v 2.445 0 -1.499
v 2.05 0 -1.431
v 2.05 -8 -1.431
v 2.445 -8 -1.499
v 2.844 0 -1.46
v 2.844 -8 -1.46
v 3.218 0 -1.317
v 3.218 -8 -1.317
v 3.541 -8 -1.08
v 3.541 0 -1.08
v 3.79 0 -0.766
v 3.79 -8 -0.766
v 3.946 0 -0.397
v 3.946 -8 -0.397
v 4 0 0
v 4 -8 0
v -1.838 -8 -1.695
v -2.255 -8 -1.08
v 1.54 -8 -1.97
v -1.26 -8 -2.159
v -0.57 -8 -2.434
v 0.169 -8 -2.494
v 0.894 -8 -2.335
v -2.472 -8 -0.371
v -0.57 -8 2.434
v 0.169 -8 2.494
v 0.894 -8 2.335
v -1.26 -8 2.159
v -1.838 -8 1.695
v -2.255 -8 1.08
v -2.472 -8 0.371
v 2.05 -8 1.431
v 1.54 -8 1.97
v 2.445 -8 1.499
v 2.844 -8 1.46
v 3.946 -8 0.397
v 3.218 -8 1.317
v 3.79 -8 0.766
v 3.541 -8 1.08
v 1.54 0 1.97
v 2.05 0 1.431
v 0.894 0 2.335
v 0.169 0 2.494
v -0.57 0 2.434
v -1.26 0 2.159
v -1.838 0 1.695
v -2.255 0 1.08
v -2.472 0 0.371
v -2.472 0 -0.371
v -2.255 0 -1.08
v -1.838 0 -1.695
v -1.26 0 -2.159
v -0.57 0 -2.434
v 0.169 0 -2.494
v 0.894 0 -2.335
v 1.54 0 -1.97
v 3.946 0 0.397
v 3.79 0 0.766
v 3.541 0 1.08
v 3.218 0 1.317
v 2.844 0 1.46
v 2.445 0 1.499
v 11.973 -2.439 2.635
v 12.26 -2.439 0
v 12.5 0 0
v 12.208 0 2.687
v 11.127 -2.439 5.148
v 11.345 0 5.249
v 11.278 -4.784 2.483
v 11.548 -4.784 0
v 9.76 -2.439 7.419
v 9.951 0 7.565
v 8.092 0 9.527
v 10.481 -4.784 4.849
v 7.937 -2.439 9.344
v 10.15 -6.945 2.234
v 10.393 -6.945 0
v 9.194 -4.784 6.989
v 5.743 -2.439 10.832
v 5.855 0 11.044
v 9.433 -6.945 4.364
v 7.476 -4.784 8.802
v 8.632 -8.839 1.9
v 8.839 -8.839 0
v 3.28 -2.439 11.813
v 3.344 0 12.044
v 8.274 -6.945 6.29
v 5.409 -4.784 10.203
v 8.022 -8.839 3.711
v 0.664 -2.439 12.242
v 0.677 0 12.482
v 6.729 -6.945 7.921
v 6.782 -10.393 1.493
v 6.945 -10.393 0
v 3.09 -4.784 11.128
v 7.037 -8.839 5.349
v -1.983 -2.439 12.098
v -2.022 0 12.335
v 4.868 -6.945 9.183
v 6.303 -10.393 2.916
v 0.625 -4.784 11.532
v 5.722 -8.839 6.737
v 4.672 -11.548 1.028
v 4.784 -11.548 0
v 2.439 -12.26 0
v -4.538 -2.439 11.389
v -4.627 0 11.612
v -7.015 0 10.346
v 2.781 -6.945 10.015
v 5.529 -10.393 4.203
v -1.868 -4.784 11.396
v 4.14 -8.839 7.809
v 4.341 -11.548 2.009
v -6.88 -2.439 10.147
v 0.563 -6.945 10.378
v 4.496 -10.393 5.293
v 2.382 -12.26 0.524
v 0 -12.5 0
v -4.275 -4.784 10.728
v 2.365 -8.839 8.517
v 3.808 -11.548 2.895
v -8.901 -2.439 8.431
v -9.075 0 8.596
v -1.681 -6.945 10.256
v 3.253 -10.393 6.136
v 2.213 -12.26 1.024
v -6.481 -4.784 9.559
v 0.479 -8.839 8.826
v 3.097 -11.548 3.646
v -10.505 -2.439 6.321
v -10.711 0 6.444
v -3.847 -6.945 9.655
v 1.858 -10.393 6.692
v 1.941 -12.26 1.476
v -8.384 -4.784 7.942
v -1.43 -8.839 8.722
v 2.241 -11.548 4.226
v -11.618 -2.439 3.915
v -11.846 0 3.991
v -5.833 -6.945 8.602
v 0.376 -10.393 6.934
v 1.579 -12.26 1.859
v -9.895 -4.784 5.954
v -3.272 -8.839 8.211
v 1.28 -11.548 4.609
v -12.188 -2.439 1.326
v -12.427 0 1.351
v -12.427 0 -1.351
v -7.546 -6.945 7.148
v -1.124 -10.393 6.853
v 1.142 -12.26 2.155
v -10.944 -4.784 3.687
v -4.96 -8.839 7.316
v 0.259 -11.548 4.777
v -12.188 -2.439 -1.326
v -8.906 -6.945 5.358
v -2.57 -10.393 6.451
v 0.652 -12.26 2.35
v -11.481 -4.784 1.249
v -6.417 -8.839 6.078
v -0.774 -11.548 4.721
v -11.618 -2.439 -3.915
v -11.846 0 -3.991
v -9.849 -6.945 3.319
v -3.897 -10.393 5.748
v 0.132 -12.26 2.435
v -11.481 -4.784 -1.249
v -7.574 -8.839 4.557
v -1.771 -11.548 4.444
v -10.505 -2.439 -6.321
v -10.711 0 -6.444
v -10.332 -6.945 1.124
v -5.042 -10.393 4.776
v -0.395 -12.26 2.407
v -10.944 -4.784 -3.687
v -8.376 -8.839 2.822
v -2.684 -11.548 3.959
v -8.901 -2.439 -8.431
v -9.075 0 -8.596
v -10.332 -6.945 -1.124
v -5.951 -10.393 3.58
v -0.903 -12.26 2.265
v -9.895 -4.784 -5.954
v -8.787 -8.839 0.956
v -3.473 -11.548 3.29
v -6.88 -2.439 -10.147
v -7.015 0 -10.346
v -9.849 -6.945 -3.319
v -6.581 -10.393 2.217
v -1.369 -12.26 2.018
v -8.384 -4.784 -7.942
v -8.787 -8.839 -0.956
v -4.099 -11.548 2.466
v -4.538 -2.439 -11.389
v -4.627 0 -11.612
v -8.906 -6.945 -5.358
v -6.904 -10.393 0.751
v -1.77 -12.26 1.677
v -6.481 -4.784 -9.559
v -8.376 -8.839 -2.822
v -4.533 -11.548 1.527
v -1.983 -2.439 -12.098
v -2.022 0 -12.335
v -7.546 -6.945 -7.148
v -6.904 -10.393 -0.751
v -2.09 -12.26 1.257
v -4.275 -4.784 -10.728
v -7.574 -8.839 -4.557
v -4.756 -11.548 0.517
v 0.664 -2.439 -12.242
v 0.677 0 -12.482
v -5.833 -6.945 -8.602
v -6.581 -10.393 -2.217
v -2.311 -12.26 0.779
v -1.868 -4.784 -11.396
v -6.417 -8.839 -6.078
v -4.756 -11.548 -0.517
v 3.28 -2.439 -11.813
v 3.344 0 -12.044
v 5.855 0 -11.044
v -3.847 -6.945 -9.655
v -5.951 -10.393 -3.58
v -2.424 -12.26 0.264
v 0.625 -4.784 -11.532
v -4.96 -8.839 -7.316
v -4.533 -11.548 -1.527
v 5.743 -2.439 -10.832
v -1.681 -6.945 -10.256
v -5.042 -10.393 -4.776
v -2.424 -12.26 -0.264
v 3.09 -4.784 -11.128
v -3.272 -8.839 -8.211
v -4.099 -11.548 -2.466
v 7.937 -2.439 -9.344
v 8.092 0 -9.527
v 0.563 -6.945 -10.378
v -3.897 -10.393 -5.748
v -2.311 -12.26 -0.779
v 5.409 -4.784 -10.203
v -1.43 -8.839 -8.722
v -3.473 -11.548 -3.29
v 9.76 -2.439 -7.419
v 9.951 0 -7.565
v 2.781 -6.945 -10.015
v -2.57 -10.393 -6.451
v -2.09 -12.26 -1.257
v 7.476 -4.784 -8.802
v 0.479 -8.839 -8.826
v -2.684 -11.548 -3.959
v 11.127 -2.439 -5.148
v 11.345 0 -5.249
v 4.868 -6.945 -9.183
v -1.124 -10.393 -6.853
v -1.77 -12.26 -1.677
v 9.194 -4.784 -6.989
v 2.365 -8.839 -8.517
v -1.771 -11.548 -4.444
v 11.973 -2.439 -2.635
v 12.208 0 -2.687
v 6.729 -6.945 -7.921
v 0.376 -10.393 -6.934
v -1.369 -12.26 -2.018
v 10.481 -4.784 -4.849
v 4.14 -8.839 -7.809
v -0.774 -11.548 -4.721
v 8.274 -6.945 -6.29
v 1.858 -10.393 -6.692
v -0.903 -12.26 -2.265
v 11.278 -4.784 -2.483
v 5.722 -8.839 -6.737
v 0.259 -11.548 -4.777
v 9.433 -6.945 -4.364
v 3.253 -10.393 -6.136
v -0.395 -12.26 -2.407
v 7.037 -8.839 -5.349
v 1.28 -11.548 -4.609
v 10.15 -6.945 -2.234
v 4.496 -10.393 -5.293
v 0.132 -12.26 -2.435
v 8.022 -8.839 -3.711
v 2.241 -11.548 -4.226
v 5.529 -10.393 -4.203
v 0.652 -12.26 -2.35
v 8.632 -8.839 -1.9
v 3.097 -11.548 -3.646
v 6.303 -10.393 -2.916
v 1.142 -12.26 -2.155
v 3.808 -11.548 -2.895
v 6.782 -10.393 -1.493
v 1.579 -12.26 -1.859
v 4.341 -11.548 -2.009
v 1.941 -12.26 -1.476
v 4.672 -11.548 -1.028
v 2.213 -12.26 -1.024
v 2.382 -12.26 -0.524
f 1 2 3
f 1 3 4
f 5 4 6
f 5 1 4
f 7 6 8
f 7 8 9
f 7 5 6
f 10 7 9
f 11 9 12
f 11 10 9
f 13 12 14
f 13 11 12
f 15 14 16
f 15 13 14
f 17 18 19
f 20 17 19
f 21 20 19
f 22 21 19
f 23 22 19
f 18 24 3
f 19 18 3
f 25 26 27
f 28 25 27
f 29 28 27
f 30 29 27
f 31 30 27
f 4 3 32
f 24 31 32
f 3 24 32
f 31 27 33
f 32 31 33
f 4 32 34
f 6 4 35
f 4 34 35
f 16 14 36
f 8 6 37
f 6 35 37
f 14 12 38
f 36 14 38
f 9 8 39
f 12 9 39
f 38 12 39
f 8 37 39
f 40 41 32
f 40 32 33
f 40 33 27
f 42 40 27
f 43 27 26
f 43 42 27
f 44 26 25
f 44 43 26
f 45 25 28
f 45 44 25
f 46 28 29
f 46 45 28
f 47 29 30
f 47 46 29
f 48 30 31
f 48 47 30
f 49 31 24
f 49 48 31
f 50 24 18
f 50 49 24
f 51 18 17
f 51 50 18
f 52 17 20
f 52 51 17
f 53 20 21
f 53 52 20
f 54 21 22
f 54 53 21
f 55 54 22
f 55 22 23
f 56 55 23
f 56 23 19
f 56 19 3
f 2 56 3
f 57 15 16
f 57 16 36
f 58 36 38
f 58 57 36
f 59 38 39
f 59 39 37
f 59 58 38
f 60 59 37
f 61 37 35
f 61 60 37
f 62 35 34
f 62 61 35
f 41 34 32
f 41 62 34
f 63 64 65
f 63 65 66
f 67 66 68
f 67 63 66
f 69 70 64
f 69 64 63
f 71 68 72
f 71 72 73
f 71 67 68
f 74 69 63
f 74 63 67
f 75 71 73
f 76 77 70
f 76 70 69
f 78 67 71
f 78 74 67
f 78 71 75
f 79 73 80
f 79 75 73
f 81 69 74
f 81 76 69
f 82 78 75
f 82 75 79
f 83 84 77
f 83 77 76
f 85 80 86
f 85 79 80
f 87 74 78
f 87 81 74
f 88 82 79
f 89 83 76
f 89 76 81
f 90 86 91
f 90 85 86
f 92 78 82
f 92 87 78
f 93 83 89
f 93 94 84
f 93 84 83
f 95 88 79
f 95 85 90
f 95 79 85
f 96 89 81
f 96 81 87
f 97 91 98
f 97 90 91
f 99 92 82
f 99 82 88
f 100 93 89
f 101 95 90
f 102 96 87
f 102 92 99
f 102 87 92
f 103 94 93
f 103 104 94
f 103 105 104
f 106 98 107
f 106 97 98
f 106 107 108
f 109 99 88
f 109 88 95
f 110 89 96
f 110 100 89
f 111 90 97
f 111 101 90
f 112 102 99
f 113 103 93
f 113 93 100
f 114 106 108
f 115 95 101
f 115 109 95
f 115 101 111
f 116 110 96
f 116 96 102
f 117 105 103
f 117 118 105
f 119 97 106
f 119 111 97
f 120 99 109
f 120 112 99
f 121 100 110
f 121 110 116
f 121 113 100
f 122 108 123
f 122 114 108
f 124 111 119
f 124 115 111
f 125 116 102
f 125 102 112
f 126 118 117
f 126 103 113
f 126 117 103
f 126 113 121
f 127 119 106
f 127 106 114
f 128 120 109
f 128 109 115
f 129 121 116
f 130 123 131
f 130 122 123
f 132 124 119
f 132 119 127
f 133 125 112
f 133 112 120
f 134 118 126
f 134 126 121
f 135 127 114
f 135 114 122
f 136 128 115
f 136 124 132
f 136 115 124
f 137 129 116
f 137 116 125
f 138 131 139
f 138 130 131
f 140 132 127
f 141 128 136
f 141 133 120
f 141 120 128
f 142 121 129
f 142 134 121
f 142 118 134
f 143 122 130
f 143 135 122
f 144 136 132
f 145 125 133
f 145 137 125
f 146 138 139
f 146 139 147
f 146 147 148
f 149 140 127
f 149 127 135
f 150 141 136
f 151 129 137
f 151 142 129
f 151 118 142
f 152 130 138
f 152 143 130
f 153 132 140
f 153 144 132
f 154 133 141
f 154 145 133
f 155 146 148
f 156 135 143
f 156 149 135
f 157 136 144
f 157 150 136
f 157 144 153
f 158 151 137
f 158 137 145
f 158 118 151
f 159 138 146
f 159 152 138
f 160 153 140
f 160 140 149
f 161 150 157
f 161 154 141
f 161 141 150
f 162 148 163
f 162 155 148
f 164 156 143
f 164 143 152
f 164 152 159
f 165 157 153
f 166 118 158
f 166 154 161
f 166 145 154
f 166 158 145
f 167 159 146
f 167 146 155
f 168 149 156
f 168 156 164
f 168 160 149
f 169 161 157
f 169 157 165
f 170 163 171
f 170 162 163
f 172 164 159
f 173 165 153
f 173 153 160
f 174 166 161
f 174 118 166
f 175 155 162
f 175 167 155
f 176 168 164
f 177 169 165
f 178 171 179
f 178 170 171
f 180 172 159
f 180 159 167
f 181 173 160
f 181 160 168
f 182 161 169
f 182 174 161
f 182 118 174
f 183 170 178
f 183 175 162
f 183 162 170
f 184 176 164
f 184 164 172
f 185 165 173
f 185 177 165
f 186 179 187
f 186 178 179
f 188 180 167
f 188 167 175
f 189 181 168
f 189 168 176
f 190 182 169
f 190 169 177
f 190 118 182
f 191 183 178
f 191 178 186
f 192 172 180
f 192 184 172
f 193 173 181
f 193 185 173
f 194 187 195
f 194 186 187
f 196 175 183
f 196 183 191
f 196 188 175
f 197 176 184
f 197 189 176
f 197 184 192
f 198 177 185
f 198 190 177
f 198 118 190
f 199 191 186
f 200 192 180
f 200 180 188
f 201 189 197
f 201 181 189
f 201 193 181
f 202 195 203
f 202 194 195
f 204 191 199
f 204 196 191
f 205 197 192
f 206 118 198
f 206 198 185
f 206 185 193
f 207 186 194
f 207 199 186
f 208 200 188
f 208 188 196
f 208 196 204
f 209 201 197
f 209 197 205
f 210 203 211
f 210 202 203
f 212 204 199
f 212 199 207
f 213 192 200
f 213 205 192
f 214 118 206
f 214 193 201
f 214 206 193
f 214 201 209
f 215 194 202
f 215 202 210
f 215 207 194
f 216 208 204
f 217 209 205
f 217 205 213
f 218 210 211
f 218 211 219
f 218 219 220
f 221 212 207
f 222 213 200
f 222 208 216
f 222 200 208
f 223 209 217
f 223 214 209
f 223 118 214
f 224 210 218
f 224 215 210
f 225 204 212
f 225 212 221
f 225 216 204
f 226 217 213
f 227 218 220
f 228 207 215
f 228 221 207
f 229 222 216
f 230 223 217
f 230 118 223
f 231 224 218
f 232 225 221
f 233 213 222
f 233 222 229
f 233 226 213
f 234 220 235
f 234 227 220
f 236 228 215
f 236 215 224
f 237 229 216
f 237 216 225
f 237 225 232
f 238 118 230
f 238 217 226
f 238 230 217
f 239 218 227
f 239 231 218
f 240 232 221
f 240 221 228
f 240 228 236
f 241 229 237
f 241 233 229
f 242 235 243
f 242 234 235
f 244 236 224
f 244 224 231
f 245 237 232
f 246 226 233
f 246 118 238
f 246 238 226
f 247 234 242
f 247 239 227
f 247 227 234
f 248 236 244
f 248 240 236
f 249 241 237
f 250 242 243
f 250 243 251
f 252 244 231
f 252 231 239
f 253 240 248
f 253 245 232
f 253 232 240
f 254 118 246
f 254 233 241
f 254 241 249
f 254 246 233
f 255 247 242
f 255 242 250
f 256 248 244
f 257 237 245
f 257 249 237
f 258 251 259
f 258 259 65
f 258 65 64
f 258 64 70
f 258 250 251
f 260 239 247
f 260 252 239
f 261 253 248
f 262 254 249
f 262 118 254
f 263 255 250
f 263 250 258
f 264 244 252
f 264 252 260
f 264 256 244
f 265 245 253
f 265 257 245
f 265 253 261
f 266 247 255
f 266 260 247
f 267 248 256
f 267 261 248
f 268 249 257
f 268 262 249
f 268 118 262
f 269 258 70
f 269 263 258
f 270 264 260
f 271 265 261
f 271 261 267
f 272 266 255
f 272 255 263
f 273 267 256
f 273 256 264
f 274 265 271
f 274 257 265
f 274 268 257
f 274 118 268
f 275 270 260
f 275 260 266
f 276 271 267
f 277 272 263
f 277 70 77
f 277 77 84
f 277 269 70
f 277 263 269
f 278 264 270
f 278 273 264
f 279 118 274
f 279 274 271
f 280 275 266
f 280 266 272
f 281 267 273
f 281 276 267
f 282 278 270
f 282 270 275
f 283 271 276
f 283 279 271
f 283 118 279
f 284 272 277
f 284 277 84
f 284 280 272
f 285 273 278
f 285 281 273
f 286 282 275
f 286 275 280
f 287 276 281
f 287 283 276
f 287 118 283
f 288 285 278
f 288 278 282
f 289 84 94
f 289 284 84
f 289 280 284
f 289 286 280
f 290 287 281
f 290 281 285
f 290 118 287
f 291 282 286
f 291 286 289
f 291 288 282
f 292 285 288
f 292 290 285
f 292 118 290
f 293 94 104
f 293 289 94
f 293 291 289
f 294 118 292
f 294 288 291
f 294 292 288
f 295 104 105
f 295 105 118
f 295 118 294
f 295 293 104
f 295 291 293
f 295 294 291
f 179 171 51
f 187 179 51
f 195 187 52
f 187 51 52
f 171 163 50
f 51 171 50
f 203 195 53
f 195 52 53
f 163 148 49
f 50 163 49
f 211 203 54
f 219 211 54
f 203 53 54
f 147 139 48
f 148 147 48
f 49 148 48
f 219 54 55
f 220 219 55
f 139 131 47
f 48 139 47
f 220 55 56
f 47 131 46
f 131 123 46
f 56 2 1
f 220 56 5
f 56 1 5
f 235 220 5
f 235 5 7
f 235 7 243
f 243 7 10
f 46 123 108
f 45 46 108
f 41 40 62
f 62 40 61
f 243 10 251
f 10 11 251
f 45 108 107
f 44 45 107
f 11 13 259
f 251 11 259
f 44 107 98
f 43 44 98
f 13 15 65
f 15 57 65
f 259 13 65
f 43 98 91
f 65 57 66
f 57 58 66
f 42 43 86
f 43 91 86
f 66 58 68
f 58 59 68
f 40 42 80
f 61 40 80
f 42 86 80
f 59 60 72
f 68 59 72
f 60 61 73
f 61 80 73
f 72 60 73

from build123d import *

# Parameters (mm, degrees)
F1_DEPTH = 8
F0_R     = 12.5
F2_R     = 12.5
F3_DEPTH = 12.5
F4_R     = 12.49999
F7_DEPTH = 8


# Not quite as in the source:
# - a fillet or chamfer is up to 0.001 mm smaller than in the source, because OpenCascade refuses the exact size


with BuildPart() as f1:
    # F0 (on Front) → F1 (new body)
    with BuildSketch(Plane.XZ):
        with BuildLine():
            ThreePointArc((0.1338848412, 2.0937357457), (0.1198892217, 2.2981641713), (0.0781635329, 2.4987777937))
            ThreePointArc((0.0781635329, 2.4987777937), (-1.3661151588, 2.0937357457), (-2.3185923934, 0.9349488293))
            ThreePointArc((-2.3185923934, 0.9349488293), (-0.7253015556, 0.7375064414), (0.1338848412, 2.0937357457))
        make_face()
    extrude(amount=F1_DEPTH)


with BuildPart() as f1b:
    # F0 (on Front) → F1, piece 2 (new body)
    with BuildSketch(Plane.XZ):
        Circle(F0_R)
        with BuildLine():
            ThreePointArc((0.0781635329, 2.4987777937), (1.7951892424, 1.7399125219), (2.5, 0))
            ThreePointArc((2.5, 0), (-0.4761927218, -2.4542291033), (-2.3185923934, 0.9349488293))
            ThreePointArc((-2.3185923934, 0.9349488293), (-2.1857842541, 3.3499771931), (0.0781635329, 2.4987777937))
        make_face(mode=Mode.SUBTRACT)
    extrude(amount=F1_DEPTH)


with BuildPart() as f3:
    # F2 (on Front) → F3 (new body)
    with BuildSketch(Plane.XZ):
        Circle(F2_R)
    extrude(amount=F3_DEPTH)

    # F4 (radius 12.5 in the source; OpenCascade refuses exactly that, so slightly less here)
    f4_edges = [f3.edges().sort_by_distance(p)[0] for p in [
        (-12.5, -12.5, 0),
    ]]
    fillet(f4_edges, radius=F4_R)

    # F6 (on Front) → F7 (cut)
    with BuildSketch(Plane.XZ):
        with BuildLine():
            ThreePointArc((2.05, -1.4309088021), (2.3848480035, -0.75), (2.5, 0))
            ThreePointArc((2.5, 0), (2.3848480035, 0.75), (2.05, 1.4309088021))
            ThreePointArc((2.05, 1.4309088021), (1, 0), (2.05, -1.4309088021))
        make_face()
        with BuildLine():
            ThreePointArc((2.05, 1.4309088021), (2.3848480035, 0.75), (2.5, 0))
            ThreePointArc((2.5, 0), (2.3848480035, -0.75), (2.05, -1.4309088021))
            ThreePointArc((2.05, -1.4309088021), (3.3874119675, -1.2093386622), (4, 0))
            ThreePointArc((4, 0), (3.3874119675, 1.2093386622), (2.05, 1.4309088021))
        make_face()
        with BuildLine():
            ThreePointArc((2.05, -1.4309088021), (1, 0), (2.05, 1.4309088021))
            ThreePointArc((2.05, 1.4309088021), (-2.5, 0), (2.05, -1.4309088021))
        make_face()
    extrude(amount=F7_DEPTH, mode=Mode.SUBTRACT)


solid = f3.part
